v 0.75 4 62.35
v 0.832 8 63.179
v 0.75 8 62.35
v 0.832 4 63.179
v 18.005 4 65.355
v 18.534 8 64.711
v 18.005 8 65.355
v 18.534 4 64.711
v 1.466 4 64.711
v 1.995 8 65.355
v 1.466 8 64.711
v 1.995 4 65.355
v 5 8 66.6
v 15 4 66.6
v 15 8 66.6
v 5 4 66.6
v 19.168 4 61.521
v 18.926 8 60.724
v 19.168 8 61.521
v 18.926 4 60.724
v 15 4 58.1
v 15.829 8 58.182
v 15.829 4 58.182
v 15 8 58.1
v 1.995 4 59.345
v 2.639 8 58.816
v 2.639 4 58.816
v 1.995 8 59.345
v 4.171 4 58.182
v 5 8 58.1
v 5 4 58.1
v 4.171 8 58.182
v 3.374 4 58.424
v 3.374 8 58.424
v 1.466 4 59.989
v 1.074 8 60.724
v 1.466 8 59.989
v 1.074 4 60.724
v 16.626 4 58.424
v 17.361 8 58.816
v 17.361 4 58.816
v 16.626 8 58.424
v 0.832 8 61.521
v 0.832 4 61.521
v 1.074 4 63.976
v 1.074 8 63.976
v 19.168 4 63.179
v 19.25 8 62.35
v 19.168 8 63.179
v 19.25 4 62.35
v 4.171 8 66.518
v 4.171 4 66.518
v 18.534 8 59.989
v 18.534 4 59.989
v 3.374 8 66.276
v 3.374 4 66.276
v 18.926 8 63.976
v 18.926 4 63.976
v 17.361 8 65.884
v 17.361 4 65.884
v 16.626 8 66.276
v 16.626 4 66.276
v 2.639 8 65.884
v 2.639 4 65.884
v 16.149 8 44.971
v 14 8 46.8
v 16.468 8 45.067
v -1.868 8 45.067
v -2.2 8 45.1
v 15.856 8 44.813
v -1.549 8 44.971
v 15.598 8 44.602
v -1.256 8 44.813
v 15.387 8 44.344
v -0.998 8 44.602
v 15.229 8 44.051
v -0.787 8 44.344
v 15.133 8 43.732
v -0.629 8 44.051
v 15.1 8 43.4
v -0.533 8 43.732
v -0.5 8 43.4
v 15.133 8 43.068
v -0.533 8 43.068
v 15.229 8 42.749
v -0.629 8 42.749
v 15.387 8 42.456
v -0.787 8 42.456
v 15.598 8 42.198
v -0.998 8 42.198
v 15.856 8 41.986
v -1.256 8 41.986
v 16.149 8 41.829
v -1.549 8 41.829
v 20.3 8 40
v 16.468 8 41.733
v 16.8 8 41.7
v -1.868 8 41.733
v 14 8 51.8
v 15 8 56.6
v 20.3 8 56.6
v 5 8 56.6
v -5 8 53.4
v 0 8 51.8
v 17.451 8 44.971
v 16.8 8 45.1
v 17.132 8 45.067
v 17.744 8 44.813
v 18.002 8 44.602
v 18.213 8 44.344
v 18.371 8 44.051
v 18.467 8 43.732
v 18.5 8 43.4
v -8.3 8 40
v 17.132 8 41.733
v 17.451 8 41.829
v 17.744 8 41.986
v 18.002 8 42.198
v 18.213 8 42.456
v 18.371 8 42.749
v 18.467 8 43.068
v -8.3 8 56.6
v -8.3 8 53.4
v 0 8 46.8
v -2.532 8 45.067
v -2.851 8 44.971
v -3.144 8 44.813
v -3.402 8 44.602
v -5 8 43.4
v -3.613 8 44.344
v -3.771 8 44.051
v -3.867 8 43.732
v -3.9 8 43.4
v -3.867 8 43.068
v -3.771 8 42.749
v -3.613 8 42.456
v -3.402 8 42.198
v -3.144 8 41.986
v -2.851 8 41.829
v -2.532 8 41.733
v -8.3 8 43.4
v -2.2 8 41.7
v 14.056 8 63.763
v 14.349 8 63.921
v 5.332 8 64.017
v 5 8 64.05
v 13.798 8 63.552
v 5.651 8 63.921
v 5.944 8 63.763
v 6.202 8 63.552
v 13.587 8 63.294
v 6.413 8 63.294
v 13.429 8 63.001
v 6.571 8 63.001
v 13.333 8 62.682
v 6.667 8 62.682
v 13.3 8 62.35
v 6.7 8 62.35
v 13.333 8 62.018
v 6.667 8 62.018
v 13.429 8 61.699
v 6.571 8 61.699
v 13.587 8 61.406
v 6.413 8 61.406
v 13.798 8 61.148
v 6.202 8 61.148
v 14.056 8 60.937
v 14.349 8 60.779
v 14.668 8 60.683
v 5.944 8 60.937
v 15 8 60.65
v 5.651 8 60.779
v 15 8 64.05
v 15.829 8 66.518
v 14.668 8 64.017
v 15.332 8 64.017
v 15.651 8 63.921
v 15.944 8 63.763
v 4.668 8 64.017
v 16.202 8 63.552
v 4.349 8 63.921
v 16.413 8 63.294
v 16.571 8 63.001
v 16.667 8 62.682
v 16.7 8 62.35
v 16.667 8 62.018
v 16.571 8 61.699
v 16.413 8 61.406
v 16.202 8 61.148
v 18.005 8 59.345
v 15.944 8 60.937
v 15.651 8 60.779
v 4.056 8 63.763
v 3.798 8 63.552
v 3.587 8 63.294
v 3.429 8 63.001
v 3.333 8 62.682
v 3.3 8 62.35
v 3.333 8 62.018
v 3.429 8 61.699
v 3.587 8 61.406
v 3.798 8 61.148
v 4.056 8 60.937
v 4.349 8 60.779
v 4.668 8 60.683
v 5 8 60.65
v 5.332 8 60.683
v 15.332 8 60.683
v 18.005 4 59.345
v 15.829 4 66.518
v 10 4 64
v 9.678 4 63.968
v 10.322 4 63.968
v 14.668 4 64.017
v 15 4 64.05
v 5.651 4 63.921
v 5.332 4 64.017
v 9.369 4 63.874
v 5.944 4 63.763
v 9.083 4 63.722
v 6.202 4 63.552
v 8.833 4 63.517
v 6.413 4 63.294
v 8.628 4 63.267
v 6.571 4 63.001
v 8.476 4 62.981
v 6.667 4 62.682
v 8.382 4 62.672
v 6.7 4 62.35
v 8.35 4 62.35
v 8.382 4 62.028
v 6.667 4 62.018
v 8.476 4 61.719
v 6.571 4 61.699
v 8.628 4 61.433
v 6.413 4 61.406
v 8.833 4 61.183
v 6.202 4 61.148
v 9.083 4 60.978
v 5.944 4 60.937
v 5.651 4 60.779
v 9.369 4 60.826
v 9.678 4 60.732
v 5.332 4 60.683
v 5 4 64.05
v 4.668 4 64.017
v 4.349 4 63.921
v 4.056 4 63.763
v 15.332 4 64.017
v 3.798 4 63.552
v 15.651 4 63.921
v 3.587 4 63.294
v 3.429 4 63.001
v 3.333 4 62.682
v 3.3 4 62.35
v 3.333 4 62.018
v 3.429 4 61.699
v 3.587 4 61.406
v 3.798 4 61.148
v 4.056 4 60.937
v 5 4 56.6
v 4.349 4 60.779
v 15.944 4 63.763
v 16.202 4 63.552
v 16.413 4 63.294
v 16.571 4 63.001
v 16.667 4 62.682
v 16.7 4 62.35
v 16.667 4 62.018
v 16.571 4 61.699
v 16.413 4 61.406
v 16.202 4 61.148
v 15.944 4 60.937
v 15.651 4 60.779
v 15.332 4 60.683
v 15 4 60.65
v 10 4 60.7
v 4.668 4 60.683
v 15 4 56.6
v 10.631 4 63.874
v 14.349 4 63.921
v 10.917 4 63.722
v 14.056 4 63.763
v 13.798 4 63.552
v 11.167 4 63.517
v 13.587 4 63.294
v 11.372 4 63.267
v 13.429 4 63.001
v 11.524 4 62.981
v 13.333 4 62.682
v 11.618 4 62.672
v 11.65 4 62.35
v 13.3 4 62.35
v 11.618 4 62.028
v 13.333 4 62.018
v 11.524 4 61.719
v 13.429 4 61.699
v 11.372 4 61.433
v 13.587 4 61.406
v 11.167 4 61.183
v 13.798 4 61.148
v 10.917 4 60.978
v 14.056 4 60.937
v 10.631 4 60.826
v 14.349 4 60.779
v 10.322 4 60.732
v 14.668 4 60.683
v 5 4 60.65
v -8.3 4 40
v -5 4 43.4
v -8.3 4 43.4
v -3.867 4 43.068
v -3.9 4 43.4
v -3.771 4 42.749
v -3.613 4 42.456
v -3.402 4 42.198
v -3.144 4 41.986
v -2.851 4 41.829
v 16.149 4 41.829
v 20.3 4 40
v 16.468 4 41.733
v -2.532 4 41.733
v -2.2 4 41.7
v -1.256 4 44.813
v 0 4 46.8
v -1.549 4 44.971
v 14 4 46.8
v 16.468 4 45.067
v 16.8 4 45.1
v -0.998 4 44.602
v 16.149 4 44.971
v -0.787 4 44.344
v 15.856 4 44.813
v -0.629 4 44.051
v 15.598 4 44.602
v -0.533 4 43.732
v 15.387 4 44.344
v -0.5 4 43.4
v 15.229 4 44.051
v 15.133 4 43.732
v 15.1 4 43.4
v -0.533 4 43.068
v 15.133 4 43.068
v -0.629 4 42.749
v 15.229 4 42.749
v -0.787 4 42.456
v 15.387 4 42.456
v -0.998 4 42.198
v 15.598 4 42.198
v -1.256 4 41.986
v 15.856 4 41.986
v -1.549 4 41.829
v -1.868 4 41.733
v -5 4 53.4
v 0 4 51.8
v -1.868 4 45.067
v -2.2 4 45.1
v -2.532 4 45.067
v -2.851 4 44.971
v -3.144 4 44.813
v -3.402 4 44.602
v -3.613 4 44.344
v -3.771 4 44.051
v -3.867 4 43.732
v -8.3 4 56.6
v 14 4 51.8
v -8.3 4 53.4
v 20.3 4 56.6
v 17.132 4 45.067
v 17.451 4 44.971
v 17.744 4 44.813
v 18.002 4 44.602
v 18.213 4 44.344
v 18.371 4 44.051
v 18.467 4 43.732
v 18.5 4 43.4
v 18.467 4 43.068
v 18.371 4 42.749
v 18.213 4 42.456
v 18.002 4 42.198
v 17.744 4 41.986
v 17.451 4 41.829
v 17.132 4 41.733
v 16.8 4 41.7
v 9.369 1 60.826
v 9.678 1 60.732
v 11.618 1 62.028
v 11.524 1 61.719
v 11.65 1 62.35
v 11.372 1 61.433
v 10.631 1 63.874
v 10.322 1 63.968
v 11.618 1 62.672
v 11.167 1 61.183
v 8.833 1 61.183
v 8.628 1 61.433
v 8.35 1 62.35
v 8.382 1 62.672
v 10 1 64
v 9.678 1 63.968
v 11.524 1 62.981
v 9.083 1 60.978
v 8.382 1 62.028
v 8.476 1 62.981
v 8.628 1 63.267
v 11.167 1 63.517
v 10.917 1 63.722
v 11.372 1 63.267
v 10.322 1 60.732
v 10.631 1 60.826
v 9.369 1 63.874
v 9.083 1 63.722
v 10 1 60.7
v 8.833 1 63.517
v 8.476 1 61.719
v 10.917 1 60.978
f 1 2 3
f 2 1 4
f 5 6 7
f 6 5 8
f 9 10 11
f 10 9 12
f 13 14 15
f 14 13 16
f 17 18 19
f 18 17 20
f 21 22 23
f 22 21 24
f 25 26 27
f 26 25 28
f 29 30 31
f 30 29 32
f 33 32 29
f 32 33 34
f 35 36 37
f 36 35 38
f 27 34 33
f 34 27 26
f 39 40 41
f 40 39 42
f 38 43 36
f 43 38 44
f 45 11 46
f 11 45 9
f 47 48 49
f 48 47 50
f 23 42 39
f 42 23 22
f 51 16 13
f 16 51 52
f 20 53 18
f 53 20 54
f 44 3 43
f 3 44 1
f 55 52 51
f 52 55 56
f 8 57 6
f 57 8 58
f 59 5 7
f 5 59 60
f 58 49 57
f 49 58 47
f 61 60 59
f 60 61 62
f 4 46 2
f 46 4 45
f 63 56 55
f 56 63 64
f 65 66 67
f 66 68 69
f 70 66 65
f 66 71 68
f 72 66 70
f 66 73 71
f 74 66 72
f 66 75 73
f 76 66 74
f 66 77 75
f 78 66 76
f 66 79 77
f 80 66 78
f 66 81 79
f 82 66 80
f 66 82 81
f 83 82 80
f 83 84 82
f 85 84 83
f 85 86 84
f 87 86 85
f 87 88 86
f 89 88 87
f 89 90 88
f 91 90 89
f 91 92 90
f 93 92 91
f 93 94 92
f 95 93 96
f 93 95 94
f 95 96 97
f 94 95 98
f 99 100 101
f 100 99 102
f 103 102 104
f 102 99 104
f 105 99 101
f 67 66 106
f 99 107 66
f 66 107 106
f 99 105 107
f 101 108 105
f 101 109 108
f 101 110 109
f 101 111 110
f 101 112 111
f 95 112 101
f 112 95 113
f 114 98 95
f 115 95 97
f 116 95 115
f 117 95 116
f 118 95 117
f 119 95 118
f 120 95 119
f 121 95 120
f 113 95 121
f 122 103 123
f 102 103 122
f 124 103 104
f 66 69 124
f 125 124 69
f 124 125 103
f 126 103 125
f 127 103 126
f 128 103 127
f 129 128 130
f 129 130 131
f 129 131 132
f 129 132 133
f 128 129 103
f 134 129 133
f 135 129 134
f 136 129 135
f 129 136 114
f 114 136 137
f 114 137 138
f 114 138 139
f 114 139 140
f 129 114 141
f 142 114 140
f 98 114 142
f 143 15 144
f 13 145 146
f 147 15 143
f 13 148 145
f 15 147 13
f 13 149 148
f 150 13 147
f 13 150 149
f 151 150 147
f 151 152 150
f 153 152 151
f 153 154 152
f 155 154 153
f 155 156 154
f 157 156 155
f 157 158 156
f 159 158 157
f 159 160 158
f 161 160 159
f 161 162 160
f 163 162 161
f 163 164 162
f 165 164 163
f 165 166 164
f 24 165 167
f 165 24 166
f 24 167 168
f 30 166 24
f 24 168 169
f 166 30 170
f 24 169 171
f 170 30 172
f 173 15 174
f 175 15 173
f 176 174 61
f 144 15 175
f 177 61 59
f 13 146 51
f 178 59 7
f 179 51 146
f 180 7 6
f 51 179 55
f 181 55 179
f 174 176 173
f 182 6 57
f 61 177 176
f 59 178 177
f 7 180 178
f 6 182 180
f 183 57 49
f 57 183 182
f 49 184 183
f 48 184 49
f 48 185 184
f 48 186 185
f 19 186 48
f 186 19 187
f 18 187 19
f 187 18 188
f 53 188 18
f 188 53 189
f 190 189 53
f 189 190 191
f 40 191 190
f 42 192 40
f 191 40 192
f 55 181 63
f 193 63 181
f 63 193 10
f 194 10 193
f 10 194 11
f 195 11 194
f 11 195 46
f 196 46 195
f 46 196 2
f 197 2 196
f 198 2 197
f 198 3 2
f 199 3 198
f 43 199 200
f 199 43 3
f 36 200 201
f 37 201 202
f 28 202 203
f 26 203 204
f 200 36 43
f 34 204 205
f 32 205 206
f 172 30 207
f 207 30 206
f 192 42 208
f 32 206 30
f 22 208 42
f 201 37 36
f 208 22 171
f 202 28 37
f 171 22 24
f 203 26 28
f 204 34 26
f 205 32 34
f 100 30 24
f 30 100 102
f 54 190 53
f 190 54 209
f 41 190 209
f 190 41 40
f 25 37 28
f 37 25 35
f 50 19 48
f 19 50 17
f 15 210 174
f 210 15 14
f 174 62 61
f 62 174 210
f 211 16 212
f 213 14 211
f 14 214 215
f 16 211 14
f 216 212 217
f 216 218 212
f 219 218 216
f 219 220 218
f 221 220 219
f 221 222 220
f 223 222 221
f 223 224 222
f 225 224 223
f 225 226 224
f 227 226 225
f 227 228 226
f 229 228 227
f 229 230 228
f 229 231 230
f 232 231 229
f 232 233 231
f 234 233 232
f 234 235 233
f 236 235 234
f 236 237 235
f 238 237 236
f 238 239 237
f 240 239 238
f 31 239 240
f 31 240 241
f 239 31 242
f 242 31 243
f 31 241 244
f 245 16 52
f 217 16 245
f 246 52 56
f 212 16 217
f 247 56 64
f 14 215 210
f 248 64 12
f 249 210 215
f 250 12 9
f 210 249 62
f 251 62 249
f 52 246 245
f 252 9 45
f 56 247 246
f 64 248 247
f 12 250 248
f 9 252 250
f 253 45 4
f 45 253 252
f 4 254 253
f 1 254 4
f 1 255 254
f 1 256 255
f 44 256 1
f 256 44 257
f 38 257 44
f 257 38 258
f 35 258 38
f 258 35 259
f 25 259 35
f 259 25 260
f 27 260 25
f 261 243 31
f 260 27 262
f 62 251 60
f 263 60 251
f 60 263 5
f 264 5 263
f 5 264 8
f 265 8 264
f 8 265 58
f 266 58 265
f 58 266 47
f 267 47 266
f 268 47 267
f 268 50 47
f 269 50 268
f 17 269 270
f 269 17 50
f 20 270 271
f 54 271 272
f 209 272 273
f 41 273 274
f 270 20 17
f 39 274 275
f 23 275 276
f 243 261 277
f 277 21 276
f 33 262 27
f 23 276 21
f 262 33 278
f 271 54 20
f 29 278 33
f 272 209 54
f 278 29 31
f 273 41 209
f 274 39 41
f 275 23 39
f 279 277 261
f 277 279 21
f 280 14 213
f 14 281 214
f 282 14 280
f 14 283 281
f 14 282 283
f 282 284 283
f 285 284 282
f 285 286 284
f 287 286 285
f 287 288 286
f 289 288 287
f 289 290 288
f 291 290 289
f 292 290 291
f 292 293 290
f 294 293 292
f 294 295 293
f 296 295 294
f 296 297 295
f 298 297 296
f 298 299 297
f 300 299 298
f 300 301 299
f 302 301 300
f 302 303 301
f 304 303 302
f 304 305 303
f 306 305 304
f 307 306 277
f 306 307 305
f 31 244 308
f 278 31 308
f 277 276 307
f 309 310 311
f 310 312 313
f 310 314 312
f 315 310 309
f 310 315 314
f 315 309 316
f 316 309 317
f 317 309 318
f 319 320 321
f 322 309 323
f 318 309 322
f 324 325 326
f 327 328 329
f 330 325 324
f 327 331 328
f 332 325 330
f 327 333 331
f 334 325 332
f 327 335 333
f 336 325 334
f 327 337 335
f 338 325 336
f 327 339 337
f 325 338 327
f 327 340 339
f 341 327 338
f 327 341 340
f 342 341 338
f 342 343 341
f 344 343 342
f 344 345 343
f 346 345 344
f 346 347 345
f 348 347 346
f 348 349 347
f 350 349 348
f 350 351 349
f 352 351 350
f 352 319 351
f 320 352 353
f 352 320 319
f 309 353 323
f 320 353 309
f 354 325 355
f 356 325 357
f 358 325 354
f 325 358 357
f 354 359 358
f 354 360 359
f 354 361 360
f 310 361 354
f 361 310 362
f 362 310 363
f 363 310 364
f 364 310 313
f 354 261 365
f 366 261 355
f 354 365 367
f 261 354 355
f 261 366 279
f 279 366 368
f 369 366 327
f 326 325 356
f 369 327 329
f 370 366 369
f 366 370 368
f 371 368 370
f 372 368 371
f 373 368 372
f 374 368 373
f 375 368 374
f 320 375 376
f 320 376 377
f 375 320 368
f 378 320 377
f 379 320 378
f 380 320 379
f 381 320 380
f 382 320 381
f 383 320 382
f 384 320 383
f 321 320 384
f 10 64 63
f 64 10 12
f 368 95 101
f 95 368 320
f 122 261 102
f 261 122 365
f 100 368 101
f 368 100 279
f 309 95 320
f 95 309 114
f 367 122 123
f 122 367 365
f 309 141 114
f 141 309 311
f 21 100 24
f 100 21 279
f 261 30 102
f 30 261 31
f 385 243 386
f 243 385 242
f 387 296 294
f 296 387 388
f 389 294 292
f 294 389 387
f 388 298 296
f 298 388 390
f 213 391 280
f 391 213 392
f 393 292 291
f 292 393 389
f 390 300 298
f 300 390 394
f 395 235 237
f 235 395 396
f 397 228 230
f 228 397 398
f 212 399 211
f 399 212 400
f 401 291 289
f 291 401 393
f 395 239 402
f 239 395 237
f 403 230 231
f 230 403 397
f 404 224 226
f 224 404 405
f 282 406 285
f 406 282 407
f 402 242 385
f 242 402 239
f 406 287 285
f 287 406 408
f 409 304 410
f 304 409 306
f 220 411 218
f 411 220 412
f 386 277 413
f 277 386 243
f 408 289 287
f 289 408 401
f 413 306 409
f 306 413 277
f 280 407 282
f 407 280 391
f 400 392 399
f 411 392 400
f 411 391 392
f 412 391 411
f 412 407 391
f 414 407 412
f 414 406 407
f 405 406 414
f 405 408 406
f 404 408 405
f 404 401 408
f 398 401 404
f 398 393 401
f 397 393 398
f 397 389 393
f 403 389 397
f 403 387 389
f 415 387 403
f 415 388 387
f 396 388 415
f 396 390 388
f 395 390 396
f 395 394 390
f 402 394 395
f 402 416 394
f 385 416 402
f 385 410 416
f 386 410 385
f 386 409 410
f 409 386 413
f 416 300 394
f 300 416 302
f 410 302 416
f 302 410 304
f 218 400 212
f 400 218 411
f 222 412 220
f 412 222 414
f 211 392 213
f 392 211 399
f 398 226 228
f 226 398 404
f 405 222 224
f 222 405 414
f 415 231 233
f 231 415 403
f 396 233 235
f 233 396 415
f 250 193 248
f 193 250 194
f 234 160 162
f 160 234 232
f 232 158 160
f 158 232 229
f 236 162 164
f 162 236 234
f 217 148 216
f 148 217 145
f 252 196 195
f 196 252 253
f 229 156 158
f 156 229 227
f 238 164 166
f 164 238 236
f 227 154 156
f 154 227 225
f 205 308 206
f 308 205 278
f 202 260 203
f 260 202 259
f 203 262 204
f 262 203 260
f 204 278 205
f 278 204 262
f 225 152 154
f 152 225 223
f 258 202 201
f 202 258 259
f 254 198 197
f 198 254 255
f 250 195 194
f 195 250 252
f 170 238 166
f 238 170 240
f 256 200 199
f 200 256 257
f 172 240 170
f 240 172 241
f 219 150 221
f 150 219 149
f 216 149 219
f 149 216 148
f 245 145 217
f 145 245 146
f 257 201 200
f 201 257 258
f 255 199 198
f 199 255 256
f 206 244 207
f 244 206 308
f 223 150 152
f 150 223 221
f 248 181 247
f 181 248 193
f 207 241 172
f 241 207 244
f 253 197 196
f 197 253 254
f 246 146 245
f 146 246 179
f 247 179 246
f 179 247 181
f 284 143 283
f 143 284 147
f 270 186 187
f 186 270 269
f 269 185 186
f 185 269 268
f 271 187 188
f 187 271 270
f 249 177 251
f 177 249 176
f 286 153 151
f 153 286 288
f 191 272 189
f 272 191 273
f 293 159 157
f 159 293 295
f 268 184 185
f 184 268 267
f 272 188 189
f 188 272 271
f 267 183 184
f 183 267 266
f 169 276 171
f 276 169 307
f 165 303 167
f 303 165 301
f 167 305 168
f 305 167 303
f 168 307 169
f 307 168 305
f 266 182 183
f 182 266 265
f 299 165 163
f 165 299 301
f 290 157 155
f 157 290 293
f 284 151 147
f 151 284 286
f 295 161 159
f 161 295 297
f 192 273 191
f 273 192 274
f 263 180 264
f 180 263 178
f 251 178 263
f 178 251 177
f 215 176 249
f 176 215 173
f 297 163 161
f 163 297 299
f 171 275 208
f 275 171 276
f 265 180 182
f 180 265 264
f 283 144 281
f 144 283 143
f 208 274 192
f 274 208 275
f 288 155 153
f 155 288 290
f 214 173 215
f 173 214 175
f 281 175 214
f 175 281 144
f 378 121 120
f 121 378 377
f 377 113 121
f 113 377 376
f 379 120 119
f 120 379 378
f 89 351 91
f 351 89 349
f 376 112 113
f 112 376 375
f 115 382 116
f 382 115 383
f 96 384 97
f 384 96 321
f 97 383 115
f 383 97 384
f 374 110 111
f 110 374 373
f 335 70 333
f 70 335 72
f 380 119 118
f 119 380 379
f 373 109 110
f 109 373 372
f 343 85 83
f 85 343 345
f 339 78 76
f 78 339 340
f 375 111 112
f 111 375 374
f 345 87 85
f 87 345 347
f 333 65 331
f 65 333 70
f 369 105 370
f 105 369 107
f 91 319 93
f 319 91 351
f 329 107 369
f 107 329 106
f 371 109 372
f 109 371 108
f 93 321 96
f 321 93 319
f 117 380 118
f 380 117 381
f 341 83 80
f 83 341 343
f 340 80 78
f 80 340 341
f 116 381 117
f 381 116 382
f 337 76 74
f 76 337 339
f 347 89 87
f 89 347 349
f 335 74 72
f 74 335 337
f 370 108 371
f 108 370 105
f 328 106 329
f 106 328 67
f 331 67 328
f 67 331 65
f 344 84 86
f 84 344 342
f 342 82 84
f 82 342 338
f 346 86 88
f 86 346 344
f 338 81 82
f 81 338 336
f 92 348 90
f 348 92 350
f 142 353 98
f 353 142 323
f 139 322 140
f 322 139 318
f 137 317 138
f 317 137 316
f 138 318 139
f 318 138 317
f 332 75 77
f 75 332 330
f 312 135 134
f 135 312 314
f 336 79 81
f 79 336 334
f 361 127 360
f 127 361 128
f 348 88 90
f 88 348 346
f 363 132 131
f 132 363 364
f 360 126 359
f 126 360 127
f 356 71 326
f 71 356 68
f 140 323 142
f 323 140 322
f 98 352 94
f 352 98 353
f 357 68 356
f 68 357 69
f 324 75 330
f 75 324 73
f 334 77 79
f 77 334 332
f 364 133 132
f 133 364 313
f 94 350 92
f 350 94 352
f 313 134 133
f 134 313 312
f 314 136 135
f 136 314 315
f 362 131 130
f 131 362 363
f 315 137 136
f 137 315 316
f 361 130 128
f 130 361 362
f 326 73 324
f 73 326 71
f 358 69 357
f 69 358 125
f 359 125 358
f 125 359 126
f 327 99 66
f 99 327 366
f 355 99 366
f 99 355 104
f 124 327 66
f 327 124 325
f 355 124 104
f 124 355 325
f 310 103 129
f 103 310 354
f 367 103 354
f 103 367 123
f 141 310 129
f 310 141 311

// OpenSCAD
//-- P3Steel Y axis adjustable endstop holder with selectable endstop carrier
//-- This is a remix of the Y axis adjustable endstop holder for
//-- the Prusa i3 vanilla, by Matt (www.greymatterdroppings.com)

//-- Remix by AndrewBCN - Barcelona, November 2014

//-- to be attached to the back plate of the P3Steel
//-- using a single M3 x 12mm bolt + nyloc nut.

//-- requires 6 x M3 x 10mm bolts + nyloc nuts for assembly.

//-- Note about the code: for some reason the original source code
//-- had all the parts "hanging in thin air" and the Y and Z axis were shifted.
//-- This "ugly" obviously needs fixing but I was in a hurry to print this part
//-- and get a usable endstop for my P3Steel.

$fn = 32;
base_thickness = 3;
hole_distance = 9.2; // check position and adjust if needed

module p3steel_horiz_mount() {
  // inverted J shape base screwed to back plate of P3Steel
  difference() {
    translate([24,4,-19.5]) cube([base_thickness,21,21]);
    translate([20,14.5,-1.5-hole_distance]) rotate([0,90,0]) cylinder(h=10,r=3.4/2); // hole for M3 bolt
  }
  translate([27,4,-1.5]) cube([base_thickness+0.5,21,3]);
  // 3.2 = P3Steel frame thickness + tolerance
  translate([27+3.2,4,-5.5]) cube([base_thickness,21,7]);

  //brace
  difference() {
    translate([-24,4,-18.5]) cube([50,5,13]);
    translate([-53.5,3.5,-16]) rotate([0,15,0]) cube([80,10,20]);
  }
	      
  //Horizontal frame mount
  translate([-8,12,-2.5]) rotate ([90,0,0]) difference() {
    translate([-15,-4,0]) cube([50, 8, 8]);

    translate([-7,0,-2]) cylinder(h=10,r=1.75);
    translate([-7,-1.75,-2]) cube([30,3.5,10]);
    translate([23,0,-2]) cylinder(h=10,r=1.75);
  }
}

module vert_mount() {
  //Vertical Frame Mount
  translate([-10,12,20]) rotate([90,0,0]) difference() {
    translate([-5,-4,0]) cube([42, 8, 8]);
    
    translate([0,0,-2]) cylinder(h=10,r=1.75);
    translate([0,-1.75,-2]) cube([30,3.5,10]);
    translate([30,0,-2]) cylinder(h=10,r=1.75);
  }

  translate([0,0,2]) difference() {
    translate([27,4,27]) rotate([0,90,0]) cube([18, 4, 8]);

    translate([31,12,13]) rotate([90,0,0]) cylinder(h=10,r=1.75);
    translate([31,12,23]) rotate([90,0,0]) cylinder(h=10,r=1.75);
  }
	      
  translate([29.25,10,23]) rotate([90,90,0]) cube([6, 3.5, 5]);
  translate([24.5,4,23]) rotate([0,90,0]) cube([6, 3.5, 5]);
}

module makerbot_carrier() {
  // MakerBot mechanical endstop carrier piece
  difference() {
    union() {
      hull() {
	translate ([5,4,40+16.6+3.75+2]) rotate([-90,0,0]) cylinder(r=4.25,h=4);
	translate ([15,4,40+16.6+3.75+2]) rotate([-90,0,0]) cylinder(r=4.25,h=4);
      }
      translate ([-8.3,4,40]) cube ([28.6,4,16.6]);
      translate ([5,4,56.6]) cube ([10,4,2.1]);
      translate ([10,1,40+16.6+3.75+2]) rotate([-90,0,0]) cylinder(r=3.3/2,h=5);      
    }
    union() {
      // holes
      translate ([5,3,40+16.6+3.75+2]) rotate([-90,0,0]) cylinder(r=3.4/2,h=6);
      translate ([15,3,40+16.6+3.75+2]) rotate([-90,0,0]) cylinder(r=3.4/2,h=6);
      // makerbot endstop holes
      translate ([16.8,3,40+3.4]) rotate([-90,0,0]) cylinder(r=3.4/2,h=6);
      translate ([-2.2,3,40+3.4]) rotate([-90,0,0]) cylinder(r=3.4/2,h=6);
      // makerbot endstop carvings
      translate ([0,3,42+3.4+1.4]) cube([14,7,5]);
      translate ([-13,3,42+1.4]) cube([8,7,10]);
    }
  }
}

// Print it

//p3steel_horiz_mount();
//vert_mount();
makerbot_carrier();
